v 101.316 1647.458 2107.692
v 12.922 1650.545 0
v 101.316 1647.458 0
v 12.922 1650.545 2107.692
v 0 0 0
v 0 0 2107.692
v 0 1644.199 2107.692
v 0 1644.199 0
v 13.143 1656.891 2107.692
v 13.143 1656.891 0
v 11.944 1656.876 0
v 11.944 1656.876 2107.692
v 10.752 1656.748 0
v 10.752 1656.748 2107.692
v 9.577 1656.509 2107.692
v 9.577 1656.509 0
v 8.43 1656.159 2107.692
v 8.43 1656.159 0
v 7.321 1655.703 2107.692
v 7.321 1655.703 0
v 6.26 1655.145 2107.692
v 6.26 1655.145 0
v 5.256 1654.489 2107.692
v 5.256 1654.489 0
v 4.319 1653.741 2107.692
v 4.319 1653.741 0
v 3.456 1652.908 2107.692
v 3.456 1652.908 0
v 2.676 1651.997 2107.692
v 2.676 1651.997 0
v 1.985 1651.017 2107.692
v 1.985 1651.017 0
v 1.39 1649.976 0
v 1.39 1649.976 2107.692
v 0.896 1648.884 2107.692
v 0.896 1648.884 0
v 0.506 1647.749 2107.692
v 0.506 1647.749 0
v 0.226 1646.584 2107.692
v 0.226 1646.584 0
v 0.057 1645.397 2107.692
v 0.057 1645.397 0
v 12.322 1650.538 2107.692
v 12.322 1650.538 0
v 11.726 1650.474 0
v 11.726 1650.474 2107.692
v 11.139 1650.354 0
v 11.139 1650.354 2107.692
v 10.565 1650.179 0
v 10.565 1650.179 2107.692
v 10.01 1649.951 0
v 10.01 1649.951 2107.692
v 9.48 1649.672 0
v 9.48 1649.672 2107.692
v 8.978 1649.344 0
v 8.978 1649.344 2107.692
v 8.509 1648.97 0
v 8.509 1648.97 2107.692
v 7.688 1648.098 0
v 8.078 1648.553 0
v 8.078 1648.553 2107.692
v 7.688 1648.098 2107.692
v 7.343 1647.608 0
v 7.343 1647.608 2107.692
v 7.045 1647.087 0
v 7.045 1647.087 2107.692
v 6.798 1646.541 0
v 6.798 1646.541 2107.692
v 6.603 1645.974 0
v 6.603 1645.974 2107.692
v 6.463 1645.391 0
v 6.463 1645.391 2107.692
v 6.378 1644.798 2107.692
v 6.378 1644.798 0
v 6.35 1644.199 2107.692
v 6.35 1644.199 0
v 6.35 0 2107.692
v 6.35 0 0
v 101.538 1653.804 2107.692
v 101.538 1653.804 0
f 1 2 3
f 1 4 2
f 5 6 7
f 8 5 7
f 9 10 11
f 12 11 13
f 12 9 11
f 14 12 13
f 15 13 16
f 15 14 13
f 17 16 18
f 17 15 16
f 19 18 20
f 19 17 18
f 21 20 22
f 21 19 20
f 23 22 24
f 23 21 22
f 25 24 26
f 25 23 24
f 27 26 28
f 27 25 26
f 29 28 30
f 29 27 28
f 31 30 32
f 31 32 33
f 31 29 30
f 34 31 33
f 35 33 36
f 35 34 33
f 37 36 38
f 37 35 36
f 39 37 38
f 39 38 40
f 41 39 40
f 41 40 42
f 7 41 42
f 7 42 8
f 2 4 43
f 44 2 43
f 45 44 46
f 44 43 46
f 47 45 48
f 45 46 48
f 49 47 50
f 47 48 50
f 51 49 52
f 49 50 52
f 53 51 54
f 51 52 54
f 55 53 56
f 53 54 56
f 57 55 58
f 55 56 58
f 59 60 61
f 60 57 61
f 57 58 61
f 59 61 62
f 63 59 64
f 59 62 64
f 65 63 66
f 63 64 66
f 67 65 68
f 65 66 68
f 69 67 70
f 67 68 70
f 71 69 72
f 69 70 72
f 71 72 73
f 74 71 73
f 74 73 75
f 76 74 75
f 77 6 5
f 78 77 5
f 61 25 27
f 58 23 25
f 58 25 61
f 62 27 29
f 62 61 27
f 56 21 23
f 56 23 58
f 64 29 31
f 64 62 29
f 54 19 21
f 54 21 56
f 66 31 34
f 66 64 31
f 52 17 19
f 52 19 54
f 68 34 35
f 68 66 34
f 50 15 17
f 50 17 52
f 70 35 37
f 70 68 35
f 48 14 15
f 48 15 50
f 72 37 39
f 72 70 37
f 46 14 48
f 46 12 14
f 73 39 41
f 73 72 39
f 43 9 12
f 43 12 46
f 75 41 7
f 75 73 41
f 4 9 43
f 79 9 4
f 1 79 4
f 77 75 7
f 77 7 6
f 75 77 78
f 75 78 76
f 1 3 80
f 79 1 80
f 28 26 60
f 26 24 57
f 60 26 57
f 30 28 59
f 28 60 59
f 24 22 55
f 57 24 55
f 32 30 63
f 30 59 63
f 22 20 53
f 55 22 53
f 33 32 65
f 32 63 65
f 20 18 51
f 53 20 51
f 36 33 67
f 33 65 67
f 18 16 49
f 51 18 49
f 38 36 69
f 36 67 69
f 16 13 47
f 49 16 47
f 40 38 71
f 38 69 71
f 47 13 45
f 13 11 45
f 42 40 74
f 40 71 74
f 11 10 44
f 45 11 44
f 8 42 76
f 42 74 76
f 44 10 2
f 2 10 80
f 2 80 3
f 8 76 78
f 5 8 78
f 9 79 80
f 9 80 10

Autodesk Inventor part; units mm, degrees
ref_plane "YZ Plane" through (0, 0, 0) normal (1, 0, 0) x (0, 1, 0)
ref_plane "XZ Plane" through (0, 0, 0) normal (0, 1, 0) x (-1, 0, 0)
ref_plane "XY Plane" through (0, 0, 0) normal (0, 0, 1) x (1, 0, 0)
sketch "Sketch29" plane through (0, 0, 0) normal (1, 0, 0) x (0, 1, 0)
  line L0 (0, 0) -> (1657.35, 0)
  line L1 (1657.35, 0) -> (1657.35, 2107.692)
  line L2 (1657.35, 2107.692) -> (0, 2107.692)
  line L3 (0, 2107.692) -> (0, 0)
  dimension "d230" = 2107.692
  dimension "d231" = 1657.35
extrude "Plate26" add sketch "Sketch29" along normal blind 6.35
sketch "Sketch30" plane through (-0.2216, 1651.0039, 2107.692) normal (0.0348995, 0.9993908, 0) x (-0.9993908, 0.0348995, 0)
  line L0 (0, -2107.692) -> (0, 0)
  line L1 (0, 0) -> (-101.6, 0)
  line L2 (-101.6, 0) -> (-101.6, -2107.692)
  line L3 (-101.6, -2107.692) -> (0, -2107.692)
edge flange "Flange23" height 101.6 angle 92 thickness 6.35 bend radius 6.35 thickness toward (0.0348995, 0.9993908, 0) relief tear relief width 6.35 relief depth 3.175 edges at (6.35, 1657.35, 1053.846) wall of the first edge with corners at (-0.2216, 1651.0039, 0) (-0.2216, 1651.0039, 2107.692) (101.3165, 1647.4581, 2107.692) (101.3165, 1647.4581, 0)
bend "Bend23"
corner "Corner22"
equation "\"d230\" = LARGO"
equation "\"d231\" = ALTO"
equation "\"d237\" = LARGOF"
equation "\"d238\" = ANGULOF"
equation "\"BendRadius\" = Thickness"
equation "\"BendReliefWidth\" = Thickness"
equation "\"BendReliefDepth\" = 0.5 * Thickness"
equation "\"CornerReliefSize\" = 4 * Thickness"
equation "\"MinimumRemnant\" = 2 * Thickness"
equation "\"TransitionRadius\" = BendRadius"
equation "\"JacobiRadiusSize\" = BendRadius"
equation "\"GapSize\" = Thickness"
equation "\"LARGO\" = 2107.692"
equation "\"ALTO\" = 1657.35"
equation "\"LARGOF\" = 101.6"
equation "\"ANGULOF\" = 92deg"
properties part number "BackWallTop" material "Carbon Steel - A36"
